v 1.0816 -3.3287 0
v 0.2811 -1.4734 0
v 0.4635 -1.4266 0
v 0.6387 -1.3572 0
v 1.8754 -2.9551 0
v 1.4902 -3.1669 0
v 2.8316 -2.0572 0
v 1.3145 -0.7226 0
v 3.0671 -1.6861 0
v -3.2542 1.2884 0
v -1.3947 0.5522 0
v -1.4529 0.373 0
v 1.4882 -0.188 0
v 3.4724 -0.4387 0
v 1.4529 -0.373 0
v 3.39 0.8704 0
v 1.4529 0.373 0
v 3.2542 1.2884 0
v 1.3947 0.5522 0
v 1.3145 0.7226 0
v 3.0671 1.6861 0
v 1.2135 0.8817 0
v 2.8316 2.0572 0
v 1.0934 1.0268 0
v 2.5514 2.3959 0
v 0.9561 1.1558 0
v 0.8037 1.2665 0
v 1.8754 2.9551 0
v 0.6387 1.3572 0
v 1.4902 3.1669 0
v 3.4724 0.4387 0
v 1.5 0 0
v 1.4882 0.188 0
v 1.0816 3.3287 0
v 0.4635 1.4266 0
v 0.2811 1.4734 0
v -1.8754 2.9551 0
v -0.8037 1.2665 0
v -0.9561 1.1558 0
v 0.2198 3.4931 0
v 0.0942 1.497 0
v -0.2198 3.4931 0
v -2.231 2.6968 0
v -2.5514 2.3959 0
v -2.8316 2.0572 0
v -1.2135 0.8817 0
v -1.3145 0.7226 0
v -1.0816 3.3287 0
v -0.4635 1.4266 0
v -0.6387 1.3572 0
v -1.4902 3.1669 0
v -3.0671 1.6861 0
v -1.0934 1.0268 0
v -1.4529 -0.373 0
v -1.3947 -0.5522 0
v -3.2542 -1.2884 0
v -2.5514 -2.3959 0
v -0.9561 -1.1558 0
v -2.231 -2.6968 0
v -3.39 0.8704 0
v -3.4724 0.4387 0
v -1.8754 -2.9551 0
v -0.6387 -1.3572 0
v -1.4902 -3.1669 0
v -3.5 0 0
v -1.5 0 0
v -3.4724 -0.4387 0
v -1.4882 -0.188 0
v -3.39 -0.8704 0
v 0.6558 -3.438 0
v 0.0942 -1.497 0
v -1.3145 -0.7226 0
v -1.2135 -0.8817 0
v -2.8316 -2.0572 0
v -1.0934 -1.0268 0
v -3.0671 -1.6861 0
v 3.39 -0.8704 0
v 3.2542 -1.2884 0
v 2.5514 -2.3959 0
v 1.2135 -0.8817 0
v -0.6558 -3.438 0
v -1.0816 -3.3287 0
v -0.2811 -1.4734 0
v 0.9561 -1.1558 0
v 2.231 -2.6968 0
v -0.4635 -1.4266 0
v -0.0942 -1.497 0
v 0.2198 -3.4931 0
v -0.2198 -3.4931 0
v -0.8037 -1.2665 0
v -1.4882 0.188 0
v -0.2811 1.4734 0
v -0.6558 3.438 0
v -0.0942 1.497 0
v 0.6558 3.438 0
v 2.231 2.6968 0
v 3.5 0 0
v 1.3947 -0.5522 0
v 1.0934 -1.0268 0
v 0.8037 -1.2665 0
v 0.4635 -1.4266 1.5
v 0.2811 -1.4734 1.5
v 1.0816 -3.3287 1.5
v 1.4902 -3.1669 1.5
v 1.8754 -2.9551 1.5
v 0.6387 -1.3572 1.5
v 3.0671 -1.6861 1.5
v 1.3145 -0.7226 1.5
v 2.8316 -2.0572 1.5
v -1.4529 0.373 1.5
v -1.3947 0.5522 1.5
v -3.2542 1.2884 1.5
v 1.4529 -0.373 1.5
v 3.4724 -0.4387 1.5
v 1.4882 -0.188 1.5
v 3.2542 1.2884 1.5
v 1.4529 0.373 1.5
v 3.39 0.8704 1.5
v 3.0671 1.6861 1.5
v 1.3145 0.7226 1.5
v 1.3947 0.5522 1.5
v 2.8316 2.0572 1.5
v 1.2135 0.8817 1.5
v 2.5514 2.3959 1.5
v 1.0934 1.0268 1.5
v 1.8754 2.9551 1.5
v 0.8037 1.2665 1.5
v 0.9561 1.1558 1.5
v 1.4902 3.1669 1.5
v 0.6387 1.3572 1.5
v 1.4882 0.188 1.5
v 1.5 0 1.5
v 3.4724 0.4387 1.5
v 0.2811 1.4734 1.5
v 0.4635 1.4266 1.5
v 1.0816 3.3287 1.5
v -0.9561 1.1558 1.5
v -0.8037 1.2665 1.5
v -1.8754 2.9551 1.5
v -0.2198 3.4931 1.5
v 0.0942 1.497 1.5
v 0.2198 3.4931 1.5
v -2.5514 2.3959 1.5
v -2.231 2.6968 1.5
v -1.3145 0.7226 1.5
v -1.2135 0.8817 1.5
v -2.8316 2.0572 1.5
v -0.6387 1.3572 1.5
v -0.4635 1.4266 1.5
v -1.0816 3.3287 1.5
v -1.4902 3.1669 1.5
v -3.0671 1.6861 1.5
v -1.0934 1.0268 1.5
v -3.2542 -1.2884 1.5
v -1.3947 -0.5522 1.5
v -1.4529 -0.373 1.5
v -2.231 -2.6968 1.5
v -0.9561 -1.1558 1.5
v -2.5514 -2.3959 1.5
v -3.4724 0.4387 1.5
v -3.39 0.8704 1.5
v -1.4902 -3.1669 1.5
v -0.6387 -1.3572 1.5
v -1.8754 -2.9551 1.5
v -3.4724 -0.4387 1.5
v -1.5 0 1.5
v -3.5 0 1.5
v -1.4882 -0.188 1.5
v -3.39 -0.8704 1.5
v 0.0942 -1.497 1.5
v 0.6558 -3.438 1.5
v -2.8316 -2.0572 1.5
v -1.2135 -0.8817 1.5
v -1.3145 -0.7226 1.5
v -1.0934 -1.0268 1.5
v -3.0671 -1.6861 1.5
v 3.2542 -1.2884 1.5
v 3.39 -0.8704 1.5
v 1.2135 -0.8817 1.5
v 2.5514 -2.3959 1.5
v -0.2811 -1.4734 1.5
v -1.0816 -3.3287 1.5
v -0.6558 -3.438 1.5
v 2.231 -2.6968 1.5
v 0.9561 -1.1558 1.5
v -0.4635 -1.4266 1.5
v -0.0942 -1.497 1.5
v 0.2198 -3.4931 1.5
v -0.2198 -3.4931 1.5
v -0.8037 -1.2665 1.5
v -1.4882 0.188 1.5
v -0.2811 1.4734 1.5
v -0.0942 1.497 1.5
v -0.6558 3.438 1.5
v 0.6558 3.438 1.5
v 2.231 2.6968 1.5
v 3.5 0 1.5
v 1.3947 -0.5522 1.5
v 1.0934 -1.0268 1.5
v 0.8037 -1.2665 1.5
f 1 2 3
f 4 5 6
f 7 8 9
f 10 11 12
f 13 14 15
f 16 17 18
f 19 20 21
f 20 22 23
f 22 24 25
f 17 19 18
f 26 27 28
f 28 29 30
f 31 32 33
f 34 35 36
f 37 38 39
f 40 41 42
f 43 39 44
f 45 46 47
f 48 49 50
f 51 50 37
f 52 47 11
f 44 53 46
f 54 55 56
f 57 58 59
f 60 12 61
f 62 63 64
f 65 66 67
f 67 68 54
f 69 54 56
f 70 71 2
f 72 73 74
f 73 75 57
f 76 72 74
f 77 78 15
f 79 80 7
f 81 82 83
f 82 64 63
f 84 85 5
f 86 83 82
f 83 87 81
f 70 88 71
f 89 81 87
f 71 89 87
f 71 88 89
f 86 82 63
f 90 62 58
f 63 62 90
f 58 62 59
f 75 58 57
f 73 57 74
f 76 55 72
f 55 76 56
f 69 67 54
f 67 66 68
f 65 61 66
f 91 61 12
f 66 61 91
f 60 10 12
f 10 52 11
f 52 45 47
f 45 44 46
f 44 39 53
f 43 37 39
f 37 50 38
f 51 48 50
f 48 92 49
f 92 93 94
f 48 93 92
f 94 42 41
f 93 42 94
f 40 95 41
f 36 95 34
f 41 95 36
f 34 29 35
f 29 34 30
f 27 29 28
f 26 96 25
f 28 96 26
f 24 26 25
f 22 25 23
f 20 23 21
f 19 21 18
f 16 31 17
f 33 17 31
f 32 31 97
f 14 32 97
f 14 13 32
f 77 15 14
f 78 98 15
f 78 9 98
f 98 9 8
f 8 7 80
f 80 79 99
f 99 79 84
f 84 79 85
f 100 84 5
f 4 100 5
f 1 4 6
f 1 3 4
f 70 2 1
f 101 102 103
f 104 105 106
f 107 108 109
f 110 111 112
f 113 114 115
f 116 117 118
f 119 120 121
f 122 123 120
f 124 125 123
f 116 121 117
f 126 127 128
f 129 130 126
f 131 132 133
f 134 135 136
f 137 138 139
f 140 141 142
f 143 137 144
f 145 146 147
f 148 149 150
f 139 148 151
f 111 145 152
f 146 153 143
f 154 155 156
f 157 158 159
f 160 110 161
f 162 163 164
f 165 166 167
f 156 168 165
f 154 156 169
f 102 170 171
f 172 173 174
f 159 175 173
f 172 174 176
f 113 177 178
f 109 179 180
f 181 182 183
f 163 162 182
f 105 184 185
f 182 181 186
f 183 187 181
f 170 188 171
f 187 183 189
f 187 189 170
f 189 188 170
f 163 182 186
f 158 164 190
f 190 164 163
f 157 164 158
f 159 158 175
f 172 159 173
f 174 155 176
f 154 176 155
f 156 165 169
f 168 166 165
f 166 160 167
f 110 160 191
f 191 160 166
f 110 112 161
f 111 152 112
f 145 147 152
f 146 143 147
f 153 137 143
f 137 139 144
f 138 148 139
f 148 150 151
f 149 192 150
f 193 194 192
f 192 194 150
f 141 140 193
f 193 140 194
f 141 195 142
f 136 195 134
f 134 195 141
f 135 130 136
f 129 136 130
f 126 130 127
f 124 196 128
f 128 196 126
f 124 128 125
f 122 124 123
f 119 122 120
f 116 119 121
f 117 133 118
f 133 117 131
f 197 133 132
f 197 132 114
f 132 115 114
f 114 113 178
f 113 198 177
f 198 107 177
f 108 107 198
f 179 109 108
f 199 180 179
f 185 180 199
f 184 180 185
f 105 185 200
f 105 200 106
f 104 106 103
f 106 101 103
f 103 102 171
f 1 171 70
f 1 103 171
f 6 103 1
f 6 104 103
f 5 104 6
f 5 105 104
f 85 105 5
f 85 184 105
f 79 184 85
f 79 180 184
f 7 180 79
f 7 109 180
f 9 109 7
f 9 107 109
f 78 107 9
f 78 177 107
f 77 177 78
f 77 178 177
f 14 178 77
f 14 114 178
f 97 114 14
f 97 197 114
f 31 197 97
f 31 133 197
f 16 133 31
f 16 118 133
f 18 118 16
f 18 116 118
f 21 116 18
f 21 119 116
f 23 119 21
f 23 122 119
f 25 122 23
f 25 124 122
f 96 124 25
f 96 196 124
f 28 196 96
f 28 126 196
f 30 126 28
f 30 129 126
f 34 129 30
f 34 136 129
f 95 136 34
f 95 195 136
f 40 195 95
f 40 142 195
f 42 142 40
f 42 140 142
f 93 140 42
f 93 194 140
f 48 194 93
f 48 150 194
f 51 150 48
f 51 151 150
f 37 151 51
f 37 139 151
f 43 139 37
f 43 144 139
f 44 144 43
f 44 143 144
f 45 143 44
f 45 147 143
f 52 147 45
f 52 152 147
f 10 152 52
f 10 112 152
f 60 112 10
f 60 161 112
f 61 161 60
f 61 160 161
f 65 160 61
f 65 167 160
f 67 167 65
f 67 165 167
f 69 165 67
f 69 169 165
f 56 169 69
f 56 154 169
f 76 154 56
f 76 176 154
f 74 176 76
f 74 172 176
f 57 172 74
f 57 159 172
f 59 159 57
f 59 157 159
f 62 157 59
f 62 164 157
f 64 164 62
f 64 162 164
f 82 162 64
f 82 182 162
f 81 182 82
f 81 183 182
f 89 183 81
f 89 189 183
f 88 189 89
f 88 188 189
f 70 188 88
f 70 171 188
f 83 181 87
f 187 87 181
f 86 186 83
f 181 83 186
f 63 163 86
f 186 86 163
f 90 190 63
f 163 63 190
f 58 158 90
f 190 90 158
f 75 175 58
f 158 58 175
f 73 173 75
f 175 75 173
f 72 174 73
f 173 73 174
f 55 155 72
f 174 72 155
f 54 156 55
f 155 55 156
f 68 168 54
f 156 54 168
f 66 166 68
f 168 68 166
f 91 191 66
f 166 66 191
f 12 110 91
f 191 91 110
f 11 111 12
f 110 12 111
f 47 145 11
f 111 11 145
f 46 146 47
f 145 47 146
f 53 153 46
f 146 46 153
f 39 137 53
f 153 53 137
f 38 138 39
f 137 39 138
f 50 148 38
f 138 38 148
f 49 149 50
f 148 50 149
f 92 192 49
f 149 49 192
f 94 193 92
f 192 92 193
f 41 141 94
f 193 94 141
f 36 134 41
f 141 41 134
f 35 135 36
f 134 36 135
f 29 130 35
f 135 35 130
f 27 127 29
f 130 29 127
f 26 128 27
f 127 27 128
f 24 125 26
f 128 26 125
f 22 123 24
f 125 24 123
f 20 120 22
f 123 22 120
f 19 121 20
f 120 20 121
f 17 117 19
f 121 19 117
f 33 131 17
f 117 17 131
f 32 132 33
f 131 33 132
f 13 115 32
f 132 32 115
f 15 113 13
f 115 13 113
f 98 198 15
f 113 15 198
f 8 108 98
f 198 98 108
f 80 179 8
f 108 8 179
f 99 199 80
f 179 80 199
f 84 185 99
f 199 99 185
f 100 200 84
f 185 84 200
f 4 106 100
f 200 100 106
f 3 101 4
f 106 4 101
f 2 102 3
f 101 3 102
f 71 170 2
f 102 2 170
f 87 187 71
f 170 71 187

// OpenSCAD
$fn = 50;

linear_extrude(height=1.5)
difference() {
    circle(d=7);
    circle(d=3);
}
